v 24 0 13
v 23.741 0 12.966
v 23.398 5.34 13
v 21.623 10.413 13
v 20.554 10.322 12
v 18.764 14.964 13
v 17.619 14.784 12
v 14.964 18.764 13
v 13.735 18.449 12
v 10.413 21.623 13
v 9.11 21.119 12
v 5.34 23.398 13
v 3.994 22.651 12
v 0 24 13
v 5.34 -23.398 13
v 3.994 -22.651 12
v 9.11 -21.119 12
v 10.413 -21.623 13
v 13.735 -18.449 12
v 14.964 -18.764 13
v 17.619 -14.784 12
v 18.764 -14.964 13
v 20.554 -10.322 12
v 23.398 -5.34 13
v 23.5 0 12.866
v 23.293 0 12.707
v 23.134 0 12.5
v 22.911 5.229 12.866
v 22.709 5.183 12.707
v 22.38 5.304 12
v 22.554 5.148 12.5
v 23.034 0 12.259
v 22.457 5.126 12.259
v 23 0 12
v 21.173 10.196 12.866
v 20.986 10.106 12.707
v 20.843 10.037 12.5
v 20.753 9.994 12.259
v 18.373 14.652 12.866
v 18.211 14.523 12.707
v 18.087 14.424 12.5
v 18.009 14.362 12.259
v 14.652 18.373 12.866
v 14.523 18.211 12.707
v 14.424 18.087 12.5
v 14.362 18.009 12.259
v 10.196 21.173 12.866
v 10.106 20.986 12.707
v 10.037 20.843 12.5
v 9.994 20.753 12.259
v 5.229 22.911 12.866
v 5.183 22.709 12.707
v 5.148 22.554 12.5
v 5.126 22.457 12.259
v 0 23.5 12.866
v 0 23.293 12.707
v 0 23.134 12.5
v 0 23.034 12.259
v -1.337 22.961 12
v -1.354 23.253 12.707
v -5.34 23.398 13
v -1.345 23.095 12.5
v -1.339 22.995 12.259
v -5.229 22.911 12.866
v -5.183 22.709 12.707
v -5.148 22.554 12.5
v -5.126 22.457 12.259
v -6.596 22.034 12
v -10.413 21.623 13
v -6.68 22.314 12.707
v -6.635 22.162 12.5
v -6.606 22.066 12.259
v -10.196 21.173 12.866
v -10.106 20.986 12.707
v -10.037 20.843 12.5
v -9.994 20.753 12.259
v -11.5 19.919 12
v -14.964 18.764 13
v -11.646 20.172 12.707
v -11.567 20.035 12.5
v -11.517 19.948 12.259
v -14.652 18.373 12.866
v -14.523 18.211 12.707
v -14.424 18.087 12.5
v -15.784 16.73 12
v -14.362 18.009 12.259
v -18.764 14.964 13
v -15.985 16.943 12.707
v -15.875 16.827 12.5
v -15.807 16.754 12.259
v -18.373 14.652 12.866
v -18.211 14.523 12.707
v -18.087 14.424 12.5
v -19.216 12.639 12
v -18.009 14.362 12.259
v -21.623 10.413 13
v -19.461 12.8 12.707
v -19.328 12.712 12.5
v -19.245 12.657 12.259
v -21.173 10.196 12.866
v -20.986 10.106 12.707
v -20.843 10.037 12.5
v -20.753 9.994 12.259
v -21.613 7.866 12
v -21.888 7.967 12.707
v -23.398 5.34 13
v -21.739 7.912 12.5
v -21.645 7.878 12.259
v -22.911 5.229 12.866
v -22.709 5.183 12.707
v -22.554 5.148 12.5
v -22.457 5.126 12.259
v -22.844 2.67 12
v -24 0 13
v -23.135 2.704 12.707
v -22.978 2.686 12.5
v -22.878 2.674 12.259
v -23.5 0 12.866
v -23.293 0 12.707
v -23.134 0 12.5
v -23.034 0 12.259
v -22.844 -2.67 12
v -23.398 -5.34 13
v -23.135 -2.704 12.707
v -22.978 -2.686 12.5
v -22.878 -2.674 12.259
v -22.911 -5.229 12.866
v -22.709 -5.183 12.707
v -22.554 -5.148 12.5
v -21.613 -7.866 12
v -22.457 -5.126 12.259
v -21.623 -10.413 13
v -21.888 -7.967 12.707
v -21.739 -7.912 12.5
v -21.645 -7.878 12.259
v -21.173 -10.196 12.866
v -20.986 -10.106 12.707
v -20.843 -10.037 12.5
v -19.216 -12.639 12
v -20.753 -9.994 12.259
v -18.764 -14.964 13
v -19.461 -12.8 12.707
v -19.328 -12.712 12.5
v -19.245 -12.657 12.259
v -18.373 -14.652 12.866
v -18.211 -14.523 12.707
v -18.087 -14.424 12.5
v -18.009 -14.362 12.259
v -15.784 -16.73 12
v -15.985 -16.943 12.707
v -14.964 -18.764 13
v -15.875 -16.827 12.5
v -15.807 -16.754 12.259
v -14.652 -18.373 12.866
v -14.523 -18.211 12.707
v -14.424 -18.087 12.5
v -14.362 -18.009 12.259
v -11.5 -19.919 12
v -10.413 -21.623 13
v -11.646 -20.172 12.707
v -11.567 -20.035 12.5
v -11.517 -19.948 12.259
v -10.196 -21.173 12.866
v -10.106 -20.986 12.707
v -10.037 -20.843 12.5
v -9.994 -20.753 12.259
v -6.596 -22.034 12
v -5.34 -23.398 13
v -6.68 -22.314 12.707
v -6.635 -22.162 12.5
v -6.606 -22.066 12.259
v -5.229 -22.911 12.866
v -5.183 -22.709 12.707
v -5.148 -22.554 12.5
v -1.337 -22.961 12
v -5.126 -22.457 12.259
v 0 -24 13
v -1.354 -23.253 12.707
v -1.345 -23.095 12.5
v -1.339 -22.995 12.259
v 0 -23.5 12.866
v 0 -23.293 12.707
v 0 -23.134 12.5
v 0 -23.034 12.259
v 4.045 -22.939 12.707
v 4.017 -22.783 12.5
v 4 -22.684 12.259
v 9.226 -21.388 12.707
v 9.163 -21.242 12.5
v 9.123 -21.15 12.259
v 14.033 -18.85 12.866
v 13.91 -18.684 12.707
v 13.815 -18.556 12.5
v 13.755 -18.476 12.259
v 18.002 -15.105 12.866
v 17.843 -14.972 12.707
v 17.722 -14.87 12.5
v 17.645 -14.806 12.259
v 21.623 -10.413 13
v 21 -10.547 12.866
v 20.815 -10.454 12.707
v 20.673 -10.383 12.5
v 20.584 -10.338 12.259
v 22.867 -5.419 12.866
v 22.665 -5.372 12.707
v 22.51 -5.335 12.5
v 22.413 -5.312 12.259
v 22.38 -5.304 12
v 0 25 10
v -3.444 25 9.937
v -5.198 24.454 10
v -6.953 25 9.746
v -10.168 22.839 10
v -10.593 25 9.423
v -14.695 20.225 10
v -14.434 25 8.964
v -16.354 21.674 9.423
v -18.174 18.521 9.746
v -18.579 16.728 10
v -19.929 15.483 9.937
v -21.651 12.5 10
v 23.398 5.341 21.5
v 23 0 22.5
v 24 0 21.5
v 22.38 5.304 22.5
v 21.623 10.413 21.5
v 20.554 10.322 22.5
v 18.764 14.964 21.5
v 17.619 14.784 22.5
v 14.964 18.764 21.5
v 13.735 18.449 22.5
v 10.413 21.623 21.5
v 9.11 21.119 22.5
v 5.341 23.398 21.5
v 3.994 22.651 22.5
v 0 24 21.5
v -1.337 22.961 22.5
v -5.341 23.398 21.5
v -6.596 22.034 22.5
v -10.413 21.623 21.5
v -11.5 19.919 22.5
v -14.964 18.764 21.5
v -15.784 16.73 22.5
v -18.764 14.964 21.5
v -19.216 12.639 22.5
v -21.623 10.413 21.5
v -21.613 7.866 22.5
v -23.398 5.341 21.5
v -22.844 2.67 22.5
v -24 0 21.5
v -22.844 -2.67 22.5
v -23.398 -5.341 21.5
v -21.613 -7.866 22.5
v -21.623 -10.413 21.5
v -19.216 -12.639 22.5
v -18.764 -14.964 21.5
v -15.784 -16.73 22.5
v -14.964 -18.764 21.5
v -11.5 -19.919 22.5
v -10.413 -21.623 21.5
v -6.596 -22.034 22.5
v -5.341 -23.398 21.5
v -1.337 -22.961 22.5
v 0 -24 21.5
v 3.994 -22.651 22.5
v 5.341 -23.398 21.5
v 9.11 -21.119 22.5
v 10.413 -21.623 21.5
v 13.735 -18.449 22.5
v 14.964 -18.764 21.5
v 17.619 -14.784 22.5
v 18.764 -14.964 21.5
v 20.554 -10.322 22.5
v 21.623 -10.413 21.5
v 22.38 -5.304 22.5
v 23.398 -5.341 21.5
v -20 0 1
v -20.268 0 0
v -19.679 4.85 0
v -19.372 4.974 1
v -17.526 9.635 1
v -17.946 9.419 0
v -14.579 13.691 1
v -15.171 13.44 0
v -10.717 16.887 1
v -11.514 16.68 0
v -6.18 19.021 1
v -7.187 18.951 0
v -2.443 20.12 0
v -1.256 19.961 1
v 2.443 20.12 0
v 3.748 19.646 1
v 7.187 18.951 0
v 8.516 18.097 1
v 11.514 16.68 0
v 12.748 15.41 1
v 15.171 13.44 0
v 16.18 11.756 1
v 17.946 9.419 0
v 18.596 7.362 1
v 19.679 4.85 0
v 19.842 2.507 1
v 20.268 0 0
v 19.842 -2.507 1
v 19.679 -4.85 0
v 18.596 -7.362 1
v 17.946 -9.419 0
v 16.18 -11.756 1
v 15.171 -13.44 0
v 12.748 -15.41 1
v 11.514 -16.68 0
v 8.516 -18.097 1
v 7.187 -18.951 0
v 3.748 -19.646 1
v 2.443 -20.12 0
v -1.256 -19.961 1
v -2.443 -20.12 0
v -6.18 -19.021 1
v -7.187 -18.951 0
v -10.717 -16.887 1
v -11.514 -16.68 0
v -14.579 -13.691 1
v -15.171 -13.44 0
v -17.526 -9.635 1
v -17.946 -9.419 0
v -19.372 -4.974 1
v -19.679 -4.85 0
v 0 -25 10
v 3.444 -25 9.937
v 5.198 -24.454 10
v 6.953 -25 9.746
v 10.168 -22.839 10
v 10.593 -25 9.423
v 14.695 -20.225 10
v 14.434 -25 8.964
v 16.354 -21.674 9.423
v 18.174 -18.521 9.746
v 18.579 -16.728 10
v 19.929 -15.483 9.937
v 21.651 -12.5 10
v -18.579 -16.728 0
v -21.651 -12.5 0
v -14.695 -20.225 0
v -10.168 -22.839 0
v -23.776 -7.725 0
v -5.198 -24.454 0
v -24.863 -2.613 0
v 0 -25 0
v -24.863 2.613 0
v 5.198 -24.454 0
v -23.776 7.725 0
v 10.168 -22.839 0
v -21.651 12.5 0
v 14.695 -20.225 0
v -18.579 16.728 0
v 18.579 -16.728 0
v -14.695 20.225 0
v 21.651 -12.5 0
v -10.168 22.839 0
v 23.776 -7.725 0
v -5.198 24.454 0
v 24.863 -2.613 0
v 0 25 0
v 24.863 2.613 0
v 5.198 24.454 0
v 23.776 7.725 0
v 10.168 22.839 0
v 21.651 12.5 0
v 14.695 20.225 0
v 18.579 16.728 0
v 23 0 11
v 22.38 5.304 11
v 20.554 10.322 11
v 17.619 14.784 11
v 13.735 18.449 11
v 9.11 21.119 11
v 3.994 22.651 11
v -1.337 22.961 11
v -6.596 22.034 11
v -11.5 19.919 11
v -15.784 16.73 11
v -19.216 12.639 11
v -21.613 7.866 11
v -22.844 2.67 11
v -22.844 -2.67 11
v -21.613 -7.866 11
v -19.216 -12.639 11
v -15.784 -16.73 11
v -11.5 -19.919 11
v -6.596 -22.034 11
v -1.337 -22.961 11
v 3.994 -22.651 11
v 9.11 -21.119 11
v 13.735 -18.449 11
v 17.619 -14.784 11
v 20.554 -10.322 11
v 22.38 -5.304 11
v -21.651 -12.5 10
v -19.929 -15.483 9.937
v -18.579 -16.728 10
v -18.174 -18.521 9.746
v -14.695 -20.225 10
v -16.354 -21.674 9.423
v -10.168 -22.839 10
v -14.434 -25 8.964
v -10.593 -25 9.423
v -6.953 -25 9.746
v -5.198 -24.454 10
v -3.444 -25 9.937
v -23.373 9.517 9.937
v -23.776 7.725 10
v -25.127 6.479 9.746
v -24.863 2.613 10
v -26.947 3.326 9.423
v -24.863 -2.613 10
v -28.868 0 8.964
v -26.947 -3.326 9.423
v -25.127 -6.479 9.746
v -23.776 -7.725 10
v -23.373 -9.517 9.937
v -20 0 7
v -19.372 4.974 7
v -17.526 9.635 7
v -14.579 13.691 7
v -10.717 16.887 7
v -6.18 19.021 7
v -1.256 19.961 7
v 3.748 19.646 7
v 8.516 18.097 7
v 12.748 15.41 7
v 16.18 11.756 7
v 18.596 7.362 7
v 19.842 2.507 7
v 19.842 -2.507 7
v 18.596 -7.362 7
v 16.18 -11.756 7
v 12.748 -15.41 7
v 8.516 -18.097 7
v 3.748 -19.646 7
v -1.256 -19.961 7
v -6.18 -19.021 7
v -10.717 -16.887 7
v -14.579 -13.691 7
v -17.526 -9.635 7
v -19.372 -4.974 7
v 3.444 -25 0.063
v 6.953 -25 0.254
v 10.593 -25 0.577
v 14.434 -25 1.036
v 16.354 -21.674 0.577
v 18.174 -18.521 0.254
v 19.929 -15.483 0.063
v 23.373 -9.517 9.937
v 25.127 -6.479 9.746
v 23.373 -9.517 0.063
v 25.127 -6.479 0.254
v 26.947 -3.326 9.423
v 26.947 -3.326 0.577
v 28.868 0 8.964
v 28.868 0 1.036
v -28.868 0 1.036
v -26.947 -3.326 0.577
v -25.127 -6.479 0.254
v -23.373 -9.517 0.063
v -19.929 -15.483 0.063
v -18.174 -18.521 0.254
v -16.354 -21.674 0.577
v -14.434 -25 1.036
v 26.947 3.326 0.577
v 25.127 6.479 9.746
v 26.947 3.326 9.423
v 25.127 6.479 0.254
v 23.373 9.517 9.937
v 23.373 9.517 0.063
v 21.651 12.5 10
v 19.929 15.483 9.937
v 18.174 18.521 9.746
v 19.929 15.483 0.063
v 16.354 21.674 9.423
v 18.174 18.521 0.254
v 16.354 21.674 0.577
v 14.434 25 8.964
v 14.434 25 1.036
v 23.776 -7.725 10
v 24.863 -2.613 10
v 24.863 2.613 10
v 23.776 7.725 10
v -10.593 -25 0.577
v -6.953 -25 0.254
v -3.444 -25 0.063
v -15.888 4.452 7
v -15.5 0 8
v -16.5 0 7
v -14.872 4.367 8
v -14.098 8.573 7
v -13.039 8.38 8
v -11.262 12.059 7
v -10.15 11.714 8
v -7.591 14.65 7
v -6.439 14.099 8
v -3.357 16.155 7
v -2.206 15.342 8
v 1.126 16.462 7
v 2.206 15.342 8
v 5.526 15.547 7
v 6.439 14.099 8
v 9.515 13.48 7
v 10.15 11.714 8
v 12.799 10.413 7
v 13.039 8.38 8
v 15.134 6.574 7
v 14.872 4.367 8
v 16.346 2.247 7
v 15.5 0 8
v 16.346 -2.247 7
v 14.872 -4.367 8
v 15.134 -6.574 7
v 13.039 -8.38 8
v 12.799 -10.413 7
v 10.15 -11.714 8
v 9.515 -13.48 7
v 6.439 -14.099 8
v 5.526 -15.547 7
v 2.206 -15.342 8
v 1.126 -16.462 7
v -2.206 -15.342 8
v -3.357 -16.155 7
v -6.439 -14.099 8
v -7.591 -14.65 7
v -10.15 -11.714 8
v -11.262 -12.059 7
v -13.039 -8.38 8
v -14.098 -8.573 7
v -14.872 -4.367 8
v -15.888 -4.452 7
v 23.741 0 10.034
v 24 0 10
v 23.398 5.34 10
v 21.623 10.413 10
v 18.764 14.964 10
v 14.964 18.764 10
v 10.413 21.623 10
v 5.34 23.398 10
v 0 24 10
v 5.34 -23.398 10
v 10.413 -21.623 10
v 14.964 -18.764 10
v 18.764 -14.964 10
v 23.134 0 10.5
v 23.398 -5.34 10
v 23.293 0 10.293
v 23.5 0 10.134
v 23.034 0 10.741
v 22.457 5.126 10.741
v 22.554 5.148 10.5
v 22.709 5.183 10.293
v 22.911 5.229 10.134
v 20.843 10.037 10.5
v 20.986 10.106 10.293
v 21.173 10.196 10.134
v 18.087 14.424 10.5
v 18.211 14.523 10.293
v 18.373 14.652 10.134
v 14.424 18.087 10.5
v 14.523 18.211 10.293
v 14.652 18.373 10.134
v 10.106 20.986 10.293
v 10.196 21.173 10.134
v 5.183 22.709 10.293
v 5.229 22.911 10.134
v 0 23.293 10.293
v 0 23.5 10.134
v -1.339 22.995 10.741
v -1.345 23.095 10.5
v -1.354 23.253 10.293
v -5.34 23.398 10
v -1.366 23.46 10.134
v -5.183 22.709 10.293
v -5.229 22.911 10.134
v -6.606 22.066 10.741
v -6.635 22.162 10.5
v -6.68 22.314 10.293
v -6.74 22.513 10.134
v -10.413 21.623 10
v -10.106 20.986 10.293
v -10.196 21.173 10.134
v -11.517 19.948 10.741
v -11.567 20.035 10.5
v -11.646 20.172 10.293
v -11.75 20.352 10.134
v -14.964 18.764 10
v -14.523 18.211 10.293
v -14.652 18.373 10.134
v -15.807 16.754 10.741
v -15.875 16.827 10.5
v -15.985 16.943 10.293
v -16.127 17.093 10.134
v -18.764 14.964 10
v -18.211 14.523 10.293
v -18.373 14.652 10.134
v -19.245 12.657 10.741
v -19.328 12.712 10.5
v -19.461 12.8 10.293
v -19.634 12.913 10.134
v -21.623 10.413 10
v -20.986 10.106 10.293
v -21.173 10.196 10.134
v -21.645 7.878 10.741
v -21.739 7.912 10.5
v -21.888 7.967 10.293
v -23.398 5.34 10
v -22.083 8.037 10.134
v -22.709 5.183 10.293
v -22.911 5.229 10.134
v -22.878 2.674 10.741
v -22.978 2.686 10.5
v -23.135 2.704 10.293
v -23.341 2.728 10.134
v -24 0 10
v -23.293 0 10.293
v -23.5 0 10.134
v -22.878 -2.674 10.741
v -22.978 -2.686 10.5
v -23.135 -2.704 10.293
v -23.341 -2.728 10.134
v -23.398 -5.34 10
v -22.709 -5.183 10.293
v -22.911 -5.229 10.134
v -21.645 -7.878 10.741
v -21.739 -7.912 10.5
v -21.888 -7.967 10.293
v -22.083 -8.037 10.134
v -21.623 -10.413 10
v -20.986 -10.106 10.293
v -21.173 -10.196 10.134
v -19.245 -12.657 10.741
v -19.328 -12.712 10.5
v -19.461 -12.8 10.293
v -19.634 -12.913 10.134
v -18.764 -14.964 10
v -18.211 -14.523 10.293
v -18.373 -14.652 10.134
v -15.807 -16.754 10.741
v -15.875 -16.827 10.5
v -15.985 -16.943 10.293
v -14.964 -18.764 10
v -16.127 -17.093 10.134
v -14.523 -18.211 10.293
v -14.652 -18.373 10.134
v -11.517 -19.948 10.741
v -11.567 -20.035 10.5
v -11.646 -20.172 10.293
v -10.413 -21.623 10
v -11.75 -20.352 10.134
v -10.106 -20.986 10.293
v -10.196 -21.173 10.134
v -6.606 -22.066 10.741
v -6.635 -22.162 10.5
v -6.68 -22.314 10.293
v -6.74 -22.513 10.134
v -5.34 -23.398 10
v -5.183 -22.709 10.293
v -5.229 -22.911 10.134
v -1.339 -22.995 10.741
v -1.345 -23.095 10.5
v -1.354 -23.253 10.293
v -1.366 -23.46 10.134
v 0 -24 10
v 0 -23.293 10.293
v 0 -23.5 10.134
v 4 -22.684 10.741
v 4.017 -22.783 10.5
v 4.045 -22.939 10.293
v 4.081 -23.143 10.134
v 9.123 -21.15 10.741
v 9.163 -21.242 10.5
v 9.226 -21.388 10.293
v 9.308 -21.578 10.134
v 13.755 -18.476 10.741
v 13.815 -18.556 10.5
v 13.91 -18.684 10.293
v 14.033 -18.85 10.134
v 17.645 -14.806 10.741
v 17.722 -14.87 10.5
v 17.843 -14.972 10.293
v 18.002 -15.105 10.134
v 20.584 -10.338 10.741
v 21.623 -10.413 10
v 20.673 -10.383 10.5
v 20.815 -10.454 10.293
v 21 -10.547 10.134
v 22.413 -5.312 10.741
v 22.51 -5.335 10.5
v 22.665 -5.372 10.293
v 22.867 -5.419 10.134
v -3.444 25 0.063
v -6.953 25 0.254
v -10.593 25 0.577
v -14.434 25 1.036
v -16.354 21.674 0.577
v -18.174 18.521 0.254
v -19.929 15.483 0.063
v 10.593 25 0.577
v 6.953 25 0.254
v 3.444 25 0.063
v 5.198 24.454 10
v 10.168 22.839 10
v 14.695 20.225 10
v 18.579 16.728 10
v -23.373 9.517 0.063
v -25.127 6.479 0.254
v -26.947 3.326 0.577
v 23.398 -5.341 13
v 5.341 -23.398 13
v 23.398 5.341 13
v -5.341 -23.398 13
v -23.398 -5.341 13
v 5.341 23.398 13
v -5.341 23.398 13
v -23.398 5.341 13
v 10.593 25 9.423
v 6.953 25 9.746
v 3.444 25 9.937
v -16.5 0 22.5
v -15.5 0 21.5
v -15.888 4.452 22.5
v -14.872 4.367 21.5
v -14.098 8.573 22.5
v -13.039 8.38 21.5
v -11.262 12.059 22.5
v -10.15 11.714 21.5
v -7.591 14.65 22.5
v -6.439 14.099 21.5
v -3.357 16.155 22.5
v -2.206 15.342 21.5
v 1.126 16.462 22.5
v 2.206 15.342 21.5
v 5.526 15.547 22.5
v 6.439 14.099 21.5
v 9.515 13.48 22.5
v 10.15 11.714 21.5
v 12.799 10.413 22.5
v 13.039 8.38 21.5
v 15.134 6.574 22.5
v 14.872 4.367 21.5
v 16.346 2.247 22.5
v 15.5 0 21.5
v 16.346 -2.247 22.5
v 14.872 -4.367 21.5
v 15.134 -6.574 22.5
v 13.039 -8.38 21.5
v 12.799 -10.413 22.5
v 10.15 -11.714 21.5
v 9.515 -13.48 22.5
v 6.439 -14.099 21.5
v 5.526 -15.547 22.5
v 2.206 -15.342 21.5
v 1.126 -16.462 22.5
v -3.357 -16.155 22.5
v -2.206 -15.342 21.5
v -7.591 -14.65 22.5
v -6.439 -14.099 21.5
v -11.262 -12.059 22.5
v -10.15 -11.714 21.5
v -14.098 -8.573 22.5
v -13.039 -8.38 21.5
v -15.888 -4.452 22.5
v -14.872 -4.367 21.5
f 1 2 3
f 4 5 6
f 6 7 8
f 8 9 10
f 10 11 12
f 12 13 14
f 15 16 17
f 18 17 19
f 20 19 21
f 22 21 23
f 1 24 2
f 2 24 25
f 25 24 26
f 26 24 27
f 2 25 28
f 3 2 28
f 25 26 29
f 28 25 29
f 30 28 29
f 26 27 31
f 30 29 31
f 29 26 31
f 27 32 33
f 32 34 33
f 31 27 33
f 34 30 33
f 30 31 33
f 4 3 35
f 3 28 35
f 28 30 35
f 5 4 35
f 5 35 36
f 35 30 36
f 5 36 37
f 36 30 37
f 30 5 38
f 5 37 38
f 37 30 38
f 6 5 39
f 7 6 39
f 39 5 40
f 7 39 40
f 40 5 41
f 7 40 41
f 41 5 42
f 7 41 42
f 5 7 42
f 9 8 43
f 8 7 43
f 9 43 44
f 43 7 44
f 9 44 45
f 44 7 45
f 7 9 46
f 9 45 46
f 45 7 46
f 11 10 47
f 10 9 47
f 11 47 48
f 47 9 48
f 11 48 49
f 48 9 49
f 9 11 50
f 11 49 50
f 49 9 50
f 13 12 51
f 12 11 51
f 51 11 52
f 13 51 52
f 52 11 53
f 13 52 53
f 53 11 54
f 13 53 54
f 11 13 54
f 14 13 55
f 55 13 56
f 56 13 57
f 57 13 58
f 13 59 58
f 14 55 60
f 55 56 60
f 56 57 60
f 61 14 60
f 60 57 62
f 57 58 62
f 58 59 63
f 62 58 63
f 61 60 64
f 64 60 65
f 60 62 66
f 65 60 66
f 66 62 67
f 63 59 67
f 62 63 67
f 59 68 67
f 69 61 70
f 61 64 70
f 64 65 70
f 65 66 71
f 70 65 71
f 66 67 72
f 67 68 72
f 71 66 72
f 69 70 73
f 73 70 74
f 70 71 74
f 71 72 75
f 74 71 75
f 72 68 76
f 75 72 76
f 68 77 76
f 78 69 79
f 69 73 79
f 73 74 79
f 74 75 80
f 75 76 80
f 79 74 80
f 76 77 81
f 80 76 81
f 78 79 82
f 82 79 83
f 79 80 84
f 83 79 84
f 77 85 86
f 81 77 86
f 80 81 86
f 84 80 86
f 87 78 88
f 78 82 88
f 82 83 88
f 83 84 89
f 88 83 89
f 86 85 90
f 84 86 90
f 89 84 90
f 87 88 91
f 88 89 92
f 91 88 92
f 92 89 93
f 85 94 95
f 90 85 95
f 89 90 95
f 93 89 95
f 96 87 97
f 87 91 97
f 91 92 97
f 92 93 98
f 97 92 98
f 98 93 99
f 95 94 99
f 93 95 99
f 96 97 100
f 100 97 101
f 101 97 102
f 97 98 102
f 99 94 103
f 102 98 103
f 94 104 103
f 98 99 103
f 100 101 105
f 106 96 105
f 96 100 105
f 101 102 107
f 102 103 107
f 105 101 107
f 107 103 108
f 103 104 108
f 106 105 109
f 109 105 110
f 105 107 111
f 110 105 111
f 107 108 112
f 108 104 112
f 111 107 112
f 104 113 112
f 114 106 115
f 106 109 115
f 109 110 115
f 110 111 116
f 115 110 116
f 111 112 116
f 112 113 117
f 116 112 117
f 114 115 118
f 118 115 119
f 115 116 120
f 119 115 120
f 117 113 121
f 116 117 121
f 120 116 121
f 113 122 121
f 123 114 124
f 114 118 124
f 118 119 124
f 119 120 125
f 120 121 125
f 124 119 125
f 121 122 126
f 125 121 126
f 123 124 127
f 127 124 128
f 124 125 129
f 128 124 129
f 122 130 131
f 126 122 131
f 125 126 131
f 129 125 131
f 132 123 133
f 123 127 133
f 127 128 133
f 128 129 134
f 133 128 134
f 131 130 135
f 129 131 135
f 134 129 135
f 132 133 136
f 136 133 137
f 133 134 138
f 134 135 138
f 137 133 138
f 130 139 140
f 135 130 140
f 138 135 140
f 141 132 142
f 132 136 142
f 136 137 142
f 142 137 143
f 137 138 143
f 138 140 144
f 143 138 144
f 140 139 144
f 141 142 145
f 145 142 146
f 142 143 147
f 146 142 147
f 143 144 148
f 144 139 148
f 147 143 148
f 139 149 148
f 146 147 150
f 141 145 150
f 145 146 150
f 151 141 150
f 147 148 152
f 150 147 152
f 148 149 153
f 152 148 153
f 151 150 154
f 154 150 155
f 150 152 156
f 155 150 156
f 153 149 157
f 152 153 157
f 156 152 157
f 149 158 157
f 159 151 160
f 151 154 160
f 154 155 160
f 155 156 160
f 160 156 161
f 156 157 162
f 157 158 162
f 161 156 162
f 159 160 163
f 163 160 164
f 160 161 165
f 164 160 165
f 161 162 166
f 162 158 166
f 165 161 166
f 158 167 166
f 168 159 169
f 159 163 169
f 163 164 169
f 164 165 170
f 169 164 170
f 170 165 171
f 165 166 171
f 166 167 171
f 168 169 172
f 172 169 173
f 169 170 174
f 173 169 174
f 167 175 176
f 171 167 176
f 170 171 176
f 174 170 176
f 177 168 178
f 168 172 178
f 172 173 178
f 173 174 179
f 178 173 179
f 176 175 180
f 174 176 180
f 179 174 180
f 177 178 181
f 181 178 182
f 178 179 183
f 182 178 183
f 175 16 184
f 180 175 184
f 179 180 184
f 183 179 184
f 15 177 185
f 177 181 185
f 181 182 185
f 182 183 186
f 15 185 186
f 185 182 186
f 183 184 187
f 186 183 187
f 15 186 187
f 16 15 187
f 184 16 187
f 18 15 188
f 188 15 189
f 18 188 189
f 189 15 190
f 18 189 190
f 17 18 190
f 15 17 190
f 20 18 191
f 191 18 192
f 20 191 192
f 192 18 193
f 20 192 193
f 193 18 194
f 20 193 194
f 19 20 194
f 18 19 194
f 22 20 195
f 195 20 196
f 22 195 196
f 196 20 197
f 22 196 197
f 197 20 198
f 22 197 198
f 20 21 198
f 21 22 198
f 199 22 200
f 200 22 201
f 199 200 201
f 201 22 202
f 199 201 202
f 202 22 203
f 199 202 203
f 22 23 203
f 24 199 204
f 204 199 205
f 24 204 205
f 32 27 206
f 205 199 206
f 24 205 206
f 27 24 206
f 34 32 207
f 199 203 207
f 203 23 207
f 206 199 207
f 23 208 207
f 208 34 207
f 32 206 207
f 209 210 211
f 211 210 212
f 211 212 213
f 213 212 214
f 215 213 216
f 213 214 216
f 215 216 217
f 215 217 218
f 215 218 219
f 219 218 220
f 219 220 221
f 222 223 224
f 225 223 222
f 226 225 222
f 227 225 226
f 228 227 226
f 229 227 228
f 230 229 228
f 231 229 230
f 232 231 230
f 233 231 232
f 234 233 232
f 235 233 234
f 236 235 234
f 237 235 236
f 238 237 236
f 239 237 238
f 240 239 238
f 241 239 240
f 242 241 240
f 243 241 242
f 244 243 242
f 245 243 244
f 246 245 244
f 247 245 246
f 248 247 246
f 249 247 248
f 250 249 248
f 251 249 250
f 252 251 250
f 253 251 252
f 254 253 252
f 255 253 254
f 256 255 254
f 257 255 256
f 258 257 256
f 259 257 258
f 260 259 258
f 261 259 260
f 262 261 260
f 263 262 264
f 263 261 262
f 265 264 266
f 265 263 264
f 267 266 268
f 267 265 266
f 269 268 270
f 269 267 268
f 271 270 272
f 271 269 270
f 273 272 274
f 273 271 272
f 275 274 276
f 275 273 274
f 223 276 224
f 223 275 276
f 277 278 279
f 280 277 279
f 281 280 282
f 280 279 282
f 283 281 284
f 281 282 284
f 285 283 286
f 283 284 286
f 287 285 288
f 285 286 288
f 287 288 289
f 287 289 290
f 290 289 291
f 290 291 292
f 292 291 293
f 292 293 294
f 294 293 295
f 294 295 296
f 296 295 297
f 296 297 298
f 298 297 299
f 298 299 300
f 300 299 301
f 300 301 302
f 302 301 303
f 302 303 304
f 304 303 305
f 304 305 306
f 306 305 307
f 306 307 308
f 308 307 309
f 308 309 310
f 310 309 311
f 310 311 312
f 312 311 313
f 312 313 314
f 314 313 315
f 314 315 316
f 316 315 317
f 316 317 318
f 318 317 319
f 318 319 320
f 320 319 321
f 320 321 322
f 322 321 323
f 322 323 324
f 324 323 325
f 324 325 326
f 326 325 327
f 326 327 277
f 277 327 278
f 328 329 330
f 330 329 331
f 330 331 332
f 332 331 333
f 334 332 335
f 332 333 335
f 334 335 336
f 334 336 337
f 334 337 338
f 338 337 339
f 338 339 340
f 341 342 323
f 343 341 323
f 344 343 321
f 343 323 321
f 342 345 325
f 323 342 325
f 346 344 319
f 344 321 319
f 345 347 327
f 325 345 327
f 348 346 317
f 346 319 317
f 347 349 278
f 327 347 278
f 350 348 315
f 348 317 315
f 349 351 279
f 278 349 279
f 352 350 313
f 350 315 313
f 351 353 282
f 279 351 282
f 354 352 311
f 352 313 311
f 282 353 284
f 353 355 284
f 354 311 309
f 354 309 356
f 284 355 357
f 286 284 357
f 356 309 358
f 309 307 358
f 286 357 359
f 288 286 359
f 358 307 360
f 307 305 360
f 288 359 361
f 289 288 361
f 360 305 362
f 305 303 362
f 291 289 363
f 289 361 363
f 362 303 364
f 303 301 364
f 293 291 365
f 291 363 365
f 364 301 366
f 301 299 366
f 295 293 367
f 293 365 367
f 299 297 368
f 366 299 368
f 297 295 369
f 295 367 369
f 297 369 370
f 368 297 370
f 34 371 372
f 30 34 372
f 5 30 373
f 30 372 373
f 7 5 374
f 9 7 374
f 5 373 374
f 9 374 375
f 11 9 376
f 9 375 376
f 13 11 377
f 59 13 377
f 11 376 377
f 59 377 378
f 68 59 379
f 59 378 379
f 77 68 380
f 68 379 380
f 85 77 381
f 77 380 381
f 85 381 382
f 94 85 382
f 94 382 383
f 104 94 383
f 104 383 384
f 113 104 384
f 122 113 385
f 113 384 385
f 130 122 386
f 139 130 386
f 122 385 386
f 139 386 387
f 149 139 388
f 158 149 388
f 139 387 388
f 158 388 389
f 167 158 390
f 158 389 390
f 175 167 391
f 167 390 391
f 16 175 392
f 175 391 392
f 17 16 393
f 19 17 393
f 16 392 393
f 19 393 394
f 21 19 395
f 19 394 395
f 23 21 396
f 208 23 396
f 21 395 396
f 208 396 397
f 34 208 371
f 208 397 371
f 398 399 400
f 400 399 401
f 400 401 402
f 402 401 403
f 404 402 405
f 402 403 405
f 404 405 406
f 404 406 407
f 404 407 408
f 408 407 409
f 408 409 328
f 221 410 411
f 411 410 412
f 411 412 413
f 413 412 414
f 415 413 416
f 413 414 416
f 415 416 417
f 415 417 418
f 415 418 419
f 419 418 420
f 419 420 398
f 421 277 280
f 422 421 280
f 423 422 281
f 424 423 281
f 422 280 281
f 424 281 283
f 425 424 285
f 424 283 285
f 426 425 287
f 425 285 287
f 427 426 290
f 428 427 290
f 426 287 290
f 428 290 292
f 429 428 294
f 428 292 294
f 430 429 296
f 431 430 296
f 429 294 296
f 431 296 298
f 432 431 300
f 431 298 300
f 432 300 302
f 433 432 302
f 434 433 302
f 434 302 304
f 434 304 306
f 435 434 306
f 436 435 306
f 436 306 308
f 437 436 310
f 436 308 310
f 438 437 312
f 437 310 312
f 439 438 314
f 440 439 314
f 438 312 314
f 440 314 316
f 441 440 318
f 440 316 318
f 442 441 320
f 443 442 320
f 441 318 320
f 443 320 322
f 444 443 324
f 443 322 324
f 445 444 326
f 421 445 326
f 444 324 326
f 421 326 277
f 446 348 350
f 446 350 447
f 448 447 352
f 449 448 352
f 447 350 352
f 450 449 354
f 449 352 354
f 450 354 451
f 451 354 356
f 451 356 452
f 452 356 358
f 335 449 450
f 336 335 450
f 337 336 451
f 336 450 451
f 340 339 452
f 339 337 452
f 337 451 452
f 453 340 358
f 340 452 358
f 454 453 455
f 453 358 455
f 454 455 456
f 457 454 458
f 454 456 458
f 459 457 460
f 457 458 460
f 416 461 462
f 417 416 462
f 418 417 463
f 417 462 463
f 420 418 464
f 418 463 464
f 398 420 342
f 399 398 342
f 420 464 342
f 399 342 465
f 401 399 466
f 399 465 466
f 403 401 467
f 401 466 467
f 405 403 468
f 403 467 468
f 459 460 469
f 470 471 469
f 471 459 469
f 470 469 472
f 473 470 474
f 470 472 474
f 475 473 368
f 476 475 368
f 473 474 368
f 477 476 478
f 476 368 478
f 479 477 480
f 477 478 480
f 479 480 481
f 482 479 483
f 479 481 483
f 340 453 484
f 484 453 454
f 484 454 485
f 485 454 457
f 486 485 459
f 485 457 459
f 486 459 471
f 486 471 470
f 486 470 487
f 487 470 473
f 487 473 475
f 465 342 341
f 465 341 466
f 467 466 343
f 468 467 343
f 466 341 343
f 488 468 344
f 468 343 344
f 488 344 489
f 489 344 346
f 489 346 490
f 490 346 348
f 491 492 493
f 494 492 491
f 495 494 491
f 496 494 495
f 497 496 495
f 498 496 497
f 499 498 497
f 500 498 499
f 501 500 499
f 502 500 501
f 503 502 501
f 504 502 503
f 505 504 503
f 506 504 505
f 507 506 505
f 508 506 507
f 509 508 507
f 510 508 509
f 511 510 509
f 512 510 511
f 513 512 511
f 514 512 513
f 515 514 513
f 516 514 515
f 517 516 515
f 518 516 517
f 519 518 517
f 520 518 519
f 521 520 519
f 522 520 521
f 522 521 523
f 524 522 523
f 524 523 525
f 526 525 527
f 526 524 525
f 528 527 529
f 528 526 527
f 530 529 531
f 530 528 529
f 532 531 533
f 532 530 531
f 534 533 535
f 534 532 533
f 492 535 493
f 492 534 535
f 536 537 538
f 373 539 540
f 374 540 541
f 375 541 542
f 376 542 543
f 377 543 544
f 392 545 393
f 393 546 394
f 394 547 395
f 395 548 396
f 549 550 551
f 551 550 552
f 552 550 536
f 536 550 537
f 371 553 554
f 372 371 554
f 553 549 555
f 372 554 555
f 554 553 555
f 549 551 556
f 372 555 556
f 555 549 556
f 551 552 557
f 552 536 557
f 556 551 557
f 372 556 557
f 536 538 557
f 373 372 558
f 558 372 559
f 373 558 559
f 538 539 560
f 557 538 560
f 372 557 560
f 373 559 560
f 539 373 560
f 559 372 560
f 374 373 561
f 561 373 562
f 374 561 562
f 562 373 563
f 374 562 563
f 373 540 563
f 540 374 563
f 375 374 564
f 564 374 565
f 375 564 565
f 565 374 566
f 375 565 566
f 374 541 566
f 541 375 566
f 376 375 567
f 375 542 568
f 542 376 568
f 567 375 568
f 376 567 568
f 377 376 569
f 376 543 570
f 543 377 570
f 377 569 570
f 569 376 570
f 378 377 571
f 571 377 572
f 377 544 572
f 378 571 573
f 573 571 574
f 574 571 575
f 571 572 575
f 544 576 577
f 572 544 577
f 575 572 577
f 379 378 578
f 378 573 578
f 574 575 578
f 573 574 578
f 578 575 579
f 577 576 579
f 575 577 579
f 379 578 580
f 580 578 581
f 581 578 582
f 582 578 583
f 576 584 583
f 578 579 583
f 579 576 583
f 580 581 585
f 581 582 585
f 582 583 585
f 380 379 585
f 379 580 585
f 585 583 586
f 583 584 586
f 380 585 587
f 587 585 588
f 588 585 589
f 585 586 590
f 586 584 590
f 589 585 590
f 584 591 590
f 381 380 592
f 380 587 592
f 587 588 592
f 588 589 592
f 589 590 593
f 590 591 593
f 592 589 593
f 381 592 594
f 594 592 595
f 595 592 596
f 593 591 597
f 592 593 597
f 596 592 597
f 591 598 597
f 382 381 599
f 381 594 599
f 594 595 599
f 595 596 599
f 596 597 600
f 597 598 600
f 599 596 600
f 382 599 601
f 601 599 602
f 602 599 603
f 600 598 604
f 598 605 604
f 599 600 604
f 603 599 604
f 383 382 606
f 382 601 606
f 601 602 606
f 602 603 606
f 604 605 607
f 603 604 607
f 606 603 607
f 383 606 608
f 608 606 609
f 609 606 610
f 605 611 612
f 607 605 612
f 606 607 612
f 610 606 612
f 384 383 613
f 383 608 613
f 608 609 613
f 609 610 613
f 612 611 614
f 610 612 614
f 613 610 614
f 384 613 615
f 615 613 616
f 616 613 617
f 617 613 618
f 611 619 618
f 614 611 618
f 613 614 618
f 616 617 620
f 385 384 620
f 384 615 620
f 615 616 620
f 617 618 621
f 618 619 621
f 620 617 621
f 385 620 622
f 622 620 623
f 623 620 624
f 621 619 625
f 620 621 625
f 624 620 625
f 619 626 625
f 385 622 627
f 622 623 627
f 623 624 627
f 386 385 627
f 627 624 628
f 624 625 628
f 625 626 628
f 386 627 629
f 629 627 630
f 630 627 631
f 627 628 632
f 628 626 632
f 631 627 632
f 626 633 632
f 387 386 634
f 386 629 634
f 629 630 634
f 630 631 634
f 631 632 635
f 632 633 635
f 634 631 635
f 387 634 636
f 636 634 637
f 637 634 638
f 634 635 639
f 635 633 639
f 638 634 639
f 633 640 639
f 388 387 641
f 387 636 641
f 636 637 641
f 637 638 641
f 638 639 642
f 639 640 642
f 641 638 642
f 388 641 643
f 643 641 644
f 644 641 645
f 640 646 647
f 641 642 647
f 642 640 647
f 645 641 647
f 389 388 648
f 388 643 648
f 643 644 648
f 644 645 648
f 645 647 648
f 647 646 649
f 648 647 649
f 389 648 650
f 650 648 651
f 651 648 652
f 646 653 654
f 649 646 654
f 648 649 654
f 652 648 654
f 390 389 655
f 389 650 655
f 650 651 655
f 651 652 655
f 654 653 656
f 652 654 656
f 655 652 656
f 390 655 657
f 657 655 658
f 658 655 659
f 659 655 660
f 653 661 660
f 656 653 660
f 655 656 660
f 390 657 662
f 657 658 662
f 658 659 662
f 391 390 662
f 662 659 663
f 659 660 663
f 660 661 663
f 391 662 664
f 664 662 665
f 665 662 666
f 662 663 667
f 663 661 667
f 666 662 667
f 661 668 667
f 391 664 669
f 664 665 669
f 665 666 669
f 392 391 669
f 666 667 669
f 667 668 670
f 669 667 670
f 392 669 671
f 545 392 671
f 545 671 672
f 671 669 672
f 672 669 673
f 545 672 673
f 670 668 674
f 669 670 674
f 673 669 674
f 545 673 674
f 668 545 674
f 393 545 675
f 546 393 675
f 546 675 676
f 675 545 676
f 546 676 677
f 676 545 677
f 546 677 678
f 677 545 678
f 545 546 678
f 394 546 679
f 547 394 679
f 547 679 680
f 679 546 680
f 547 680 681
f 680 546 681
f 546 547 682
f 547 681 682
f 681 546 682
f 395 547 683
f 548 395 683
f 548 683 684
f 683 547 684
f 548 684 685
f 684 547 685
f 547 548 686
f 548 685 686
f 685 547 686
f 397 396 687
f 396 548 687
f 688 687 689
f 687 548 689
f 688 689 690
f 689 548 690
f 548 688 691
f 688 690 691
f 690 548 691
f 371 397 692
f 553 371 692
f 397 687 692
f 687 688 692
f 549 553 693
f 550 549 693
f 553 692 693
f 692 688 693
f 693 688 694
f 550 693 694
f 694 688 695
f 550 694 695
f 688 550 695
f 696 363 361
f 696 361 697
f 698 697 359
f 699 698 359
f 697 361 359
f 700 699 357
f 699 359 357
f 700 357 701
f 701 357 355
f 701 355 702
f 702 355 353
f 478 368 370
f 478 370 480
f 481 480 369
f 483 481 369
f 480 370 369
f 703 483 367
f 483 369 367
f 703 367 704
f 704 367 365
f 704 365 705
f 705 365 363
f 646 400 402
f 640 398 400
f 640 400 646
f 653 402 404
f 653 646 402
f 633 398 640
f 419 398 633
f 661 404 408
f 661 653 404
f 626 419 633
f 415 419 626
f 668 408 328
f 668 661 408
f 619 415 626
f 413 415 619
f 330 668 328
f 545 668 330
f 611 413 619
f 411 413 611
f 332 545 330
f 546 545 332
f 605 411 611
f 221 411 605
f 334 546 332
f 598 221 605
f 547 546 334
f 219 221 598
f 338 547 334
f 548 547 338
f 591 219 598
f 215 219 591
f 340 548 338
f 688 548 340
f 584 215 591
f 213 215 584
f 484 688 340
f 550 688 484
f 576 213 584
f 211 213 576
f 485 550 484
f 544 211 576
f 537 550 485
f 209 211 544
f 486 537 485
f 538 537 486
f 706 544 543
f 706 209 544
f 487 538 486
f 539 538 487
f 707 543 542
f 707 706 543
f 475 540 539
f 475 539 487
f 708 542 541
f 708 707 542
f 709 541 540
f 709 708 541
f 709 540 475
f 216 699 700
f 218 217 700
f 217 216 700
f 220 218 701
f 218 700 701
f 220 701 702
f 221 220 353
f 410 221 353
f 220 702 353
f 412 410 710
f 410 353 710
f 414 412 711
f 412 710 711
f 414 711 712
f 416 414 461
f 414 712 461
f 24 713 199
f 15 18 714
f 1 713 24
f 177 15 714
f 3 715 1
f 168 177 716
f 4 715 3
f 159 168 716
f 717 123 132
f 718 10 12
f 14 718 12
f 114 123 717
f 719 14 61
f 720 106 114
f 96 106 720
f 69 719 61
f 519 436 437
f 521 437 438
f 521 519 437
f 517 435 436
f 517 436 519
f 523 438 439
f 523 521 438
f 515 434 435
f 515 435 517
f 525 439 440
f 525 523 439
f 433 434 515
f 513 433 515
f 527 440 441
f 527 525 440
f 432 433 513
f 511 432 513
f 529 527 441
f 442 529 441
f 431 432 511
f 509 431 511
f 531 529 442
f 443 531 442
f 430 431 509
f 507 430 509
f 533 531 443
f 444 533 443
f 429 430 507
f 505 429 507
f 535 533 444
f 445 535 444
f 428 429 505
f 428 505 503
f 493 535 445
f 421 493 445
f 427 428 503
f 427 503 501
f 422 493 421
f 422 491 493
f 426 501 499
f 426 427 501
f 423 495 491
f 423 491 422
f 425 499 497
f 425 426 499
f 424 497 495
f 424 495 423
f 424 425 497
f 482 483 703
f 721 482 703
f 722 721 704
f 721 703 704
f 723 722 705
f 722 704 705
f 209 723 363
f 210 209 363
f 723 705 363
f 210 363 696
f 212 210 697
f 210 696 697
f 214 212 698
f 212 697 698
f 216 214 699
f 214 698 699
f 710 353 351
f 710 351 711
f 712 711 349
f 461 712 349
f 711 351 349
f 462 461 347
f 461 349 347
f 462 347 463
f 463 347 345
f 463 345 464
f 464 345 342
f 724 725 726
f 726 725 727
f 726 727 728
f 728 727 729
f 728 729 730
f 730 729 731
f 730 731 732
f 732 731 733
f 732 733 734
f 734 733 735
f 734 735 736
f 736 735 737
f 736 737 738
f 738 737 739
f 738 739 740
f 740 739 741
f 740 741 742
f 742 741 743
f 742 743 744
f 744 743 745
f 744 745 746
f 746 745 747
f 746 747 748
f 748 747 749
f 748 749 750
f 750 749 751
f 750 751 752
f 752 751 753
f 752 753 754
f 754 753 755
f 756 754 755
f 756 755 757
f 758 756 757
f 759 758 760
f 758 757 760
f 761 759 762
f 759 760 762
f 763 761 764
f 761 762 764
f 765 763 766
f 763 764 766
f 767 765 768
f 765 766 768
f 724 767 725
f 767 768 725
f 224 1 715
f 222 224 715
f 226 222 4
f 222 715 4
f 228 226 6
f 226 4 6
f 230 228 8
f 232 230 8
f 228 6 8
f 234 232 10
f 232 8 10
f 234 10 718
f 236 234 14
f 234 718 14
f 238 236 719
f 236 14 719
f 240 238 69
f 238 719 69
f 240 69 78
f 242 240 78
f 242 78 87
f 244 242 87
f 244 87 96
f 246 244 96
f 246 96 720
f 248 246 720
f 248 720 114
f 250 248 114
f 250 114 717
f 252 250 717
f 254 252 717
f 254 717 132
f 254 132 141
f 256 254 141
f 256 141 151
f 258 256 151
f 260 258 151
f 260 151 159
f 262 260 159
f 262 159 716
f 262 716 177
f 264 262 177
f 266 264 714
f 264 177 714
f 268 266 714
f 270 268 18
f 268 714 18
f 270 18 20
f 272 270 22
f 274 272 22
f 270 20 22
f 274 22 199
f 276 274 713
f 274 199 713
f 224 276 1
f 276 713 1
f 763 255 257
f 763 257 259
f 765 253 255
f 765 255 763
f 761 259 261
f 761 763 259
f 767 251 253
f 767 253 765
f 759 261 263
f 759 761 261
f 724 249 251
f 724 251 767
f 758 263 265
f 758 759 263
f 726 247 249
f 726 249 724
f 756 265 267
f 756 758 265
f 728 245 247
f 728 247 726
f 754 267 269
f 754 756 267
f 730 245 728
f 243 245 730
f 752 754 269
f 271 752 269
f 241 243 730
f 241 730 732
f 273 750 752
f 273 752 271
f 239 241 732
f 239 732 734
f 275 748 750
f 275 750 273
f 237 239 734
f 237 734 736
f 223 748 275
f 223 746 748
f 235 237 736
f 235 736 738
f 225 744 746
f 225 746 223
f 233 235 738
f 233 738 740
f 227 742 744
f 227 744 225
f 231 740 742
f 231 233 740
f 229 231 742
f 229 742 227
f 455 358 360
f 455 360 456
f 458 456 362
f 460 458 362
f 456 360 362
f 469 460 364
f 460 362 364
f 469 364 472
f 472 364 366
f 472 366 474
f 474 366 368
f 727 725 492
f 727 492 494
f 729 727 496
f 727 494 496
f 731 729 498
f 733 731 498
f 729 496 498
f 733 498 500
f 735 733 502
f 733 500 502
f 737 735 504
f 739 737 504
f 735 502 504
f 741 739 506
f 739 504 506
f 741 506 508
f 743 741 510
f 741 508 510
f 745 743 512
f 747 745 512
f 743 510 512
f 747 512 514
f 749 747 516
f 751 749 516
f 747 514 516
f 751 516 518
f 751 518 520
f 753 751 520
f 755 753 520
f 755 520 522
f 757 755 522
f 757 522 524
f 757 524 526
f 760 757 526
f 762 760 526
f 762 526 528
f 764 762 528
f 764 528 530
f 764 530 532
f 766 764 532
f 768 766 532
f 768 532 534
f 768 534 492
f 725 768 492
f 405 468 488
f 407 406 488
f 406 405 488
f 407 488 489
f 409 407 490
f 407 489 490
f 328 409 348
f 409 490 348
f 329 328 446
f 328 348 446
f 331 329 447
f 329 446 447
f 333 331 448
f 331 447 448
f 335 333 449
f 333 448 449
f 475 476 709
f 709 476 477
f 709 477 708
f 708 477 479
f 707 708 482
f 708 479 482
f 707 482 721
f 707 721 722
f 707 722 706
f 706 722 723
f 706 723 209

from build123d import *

# Parameters (mm, degrees)
BOSS_EXTRUDE1_DEPTH = 10
SKETCH2_R           = 24
BOSS_EXTRUDE2_DEPTH = 12.5
SKETCH3_R           = 20
CUT_EXTRUDE1_DEPTH  = 7
CUT_EXTRUDE2_REACH  = 43.214
SKETCH4_R           = 15.5
CHAMFER1_SIZE       = 1
CHAMFER2_SIZE       = 1
CHAMFER2_SIZE2      = 0.267949192
SKETCH5_W           = 1
SKETCH5_H           = 3
FILLET1_R           = 1


with BuildPart() as part:
    # Sketch1 → Boss-Extrude1 (new body)
    with BuildSketch(Plane.XY):
        Polygon((28.867513459, 0), (14.43375673, 25), (-14.43375673, 25), (-28.867513459, 0), (-14.43375673, -25), (14.43375673, -25), align=None)
    extrude(amount=BOSS_EXTRUDE1_DEPTH)

    # Sketch2 → Boss-Extrude2 (add)
    with BuildSketch(Plane.XY.offset(10)):
        Circle(SKETCH2_R)
    extrude(amount=BOSS_EXTRUDE2_DEPTH)

    # Sketch3 → Cut-Extrude1 (cut)
    with BuildSketch(Plane(origin=(0, 0, 0), x_dir=(-1, 0, 0), z_dir=(0, 0, -1))):
        Circle(SKETCH3_R)
    extrude(amount=-CUT_EXTRUDE1_DEPTH, mode=Mode.SUBTRACT)

    # Sketch4 → Cut-Extrude2 (cut, up to next)
    with BuildSketch(Plane(origin=(0, 0, 7), x_dir=(-1, 0, 0), z_dir=(0, 0, -1)), mode=Mode.PRIVATE) as cut_extrude2_sk1:
        Circle(SKETCH4_R)
    cut_extrude2_tool1 = extrude(cut_extrude2_sk1.sketch, amount=-CUT_EXTRUDE2_REACH, mode=Mode.PRIVATE) & part.part
    add(cut_extrude2_tool1.solids().sort_by_distance((0, 0, 7))[0], mode=Mode.SUBTRACT)

    # Chamfer1
    chamfer1_edges = [part.edges().sort_by_distance(p)[0] for p in [
        (-24, 0, 22.5),
        (15.5, 0, 22.5),
        (15.5, 0, 7),
    ]]
    chamfer(chamfer1_edges, length=CHAMFER1_SIZE)

    # Chamfer2
    chamfer2_edges = [part.edges().sort_by_distance(p)[0] for p in [
        (20, 0, 0),
    ]]
    chamfer2_side = [part.faces().sort_by_distance(p)[0] for p in [
        (20, 0, 3.5),
    ]]
    chamfer(chamfer2_edges, length=CHAMFER2_SIZE, length2=CHAMFER2_SIZE2, reference=chamfer2_side[0])

    # Sketch5 → Cut-Revolve1 (revolve, cut)
    with BuildSketch(Plane(origin=(0, 0, 0), x_dir=(1, 0, 0), z_dir=(0, 1, 0))):
        Polygon((25, -10), (28.867513459, -8.963702892), (28.867513459, -10), align=None)
        with Locations((23.5, -11.5)):
            Rectangle(SKETCH5_W, SKETCH5_H)
        Polygon((28.867513459, 0), (28.867513459, -1.036297108), (25, 0), align=None)
    revolve(axis=Axis((0, 0, -102.328960849), (0, 0, 1)), mode=Mode.SUBTRACT)

    # Fillet1
    fillet1_edges = [part.edges().sort_by_distance(p)[0] for p in [
        (-23, 0, 13),
        (-23, 0, 10),
    ]]
    fillet(fillet1_edges, radius=FILLET1_R - 0.0001)  # a hair under: the kernel refuses the full size


solid = part.part
